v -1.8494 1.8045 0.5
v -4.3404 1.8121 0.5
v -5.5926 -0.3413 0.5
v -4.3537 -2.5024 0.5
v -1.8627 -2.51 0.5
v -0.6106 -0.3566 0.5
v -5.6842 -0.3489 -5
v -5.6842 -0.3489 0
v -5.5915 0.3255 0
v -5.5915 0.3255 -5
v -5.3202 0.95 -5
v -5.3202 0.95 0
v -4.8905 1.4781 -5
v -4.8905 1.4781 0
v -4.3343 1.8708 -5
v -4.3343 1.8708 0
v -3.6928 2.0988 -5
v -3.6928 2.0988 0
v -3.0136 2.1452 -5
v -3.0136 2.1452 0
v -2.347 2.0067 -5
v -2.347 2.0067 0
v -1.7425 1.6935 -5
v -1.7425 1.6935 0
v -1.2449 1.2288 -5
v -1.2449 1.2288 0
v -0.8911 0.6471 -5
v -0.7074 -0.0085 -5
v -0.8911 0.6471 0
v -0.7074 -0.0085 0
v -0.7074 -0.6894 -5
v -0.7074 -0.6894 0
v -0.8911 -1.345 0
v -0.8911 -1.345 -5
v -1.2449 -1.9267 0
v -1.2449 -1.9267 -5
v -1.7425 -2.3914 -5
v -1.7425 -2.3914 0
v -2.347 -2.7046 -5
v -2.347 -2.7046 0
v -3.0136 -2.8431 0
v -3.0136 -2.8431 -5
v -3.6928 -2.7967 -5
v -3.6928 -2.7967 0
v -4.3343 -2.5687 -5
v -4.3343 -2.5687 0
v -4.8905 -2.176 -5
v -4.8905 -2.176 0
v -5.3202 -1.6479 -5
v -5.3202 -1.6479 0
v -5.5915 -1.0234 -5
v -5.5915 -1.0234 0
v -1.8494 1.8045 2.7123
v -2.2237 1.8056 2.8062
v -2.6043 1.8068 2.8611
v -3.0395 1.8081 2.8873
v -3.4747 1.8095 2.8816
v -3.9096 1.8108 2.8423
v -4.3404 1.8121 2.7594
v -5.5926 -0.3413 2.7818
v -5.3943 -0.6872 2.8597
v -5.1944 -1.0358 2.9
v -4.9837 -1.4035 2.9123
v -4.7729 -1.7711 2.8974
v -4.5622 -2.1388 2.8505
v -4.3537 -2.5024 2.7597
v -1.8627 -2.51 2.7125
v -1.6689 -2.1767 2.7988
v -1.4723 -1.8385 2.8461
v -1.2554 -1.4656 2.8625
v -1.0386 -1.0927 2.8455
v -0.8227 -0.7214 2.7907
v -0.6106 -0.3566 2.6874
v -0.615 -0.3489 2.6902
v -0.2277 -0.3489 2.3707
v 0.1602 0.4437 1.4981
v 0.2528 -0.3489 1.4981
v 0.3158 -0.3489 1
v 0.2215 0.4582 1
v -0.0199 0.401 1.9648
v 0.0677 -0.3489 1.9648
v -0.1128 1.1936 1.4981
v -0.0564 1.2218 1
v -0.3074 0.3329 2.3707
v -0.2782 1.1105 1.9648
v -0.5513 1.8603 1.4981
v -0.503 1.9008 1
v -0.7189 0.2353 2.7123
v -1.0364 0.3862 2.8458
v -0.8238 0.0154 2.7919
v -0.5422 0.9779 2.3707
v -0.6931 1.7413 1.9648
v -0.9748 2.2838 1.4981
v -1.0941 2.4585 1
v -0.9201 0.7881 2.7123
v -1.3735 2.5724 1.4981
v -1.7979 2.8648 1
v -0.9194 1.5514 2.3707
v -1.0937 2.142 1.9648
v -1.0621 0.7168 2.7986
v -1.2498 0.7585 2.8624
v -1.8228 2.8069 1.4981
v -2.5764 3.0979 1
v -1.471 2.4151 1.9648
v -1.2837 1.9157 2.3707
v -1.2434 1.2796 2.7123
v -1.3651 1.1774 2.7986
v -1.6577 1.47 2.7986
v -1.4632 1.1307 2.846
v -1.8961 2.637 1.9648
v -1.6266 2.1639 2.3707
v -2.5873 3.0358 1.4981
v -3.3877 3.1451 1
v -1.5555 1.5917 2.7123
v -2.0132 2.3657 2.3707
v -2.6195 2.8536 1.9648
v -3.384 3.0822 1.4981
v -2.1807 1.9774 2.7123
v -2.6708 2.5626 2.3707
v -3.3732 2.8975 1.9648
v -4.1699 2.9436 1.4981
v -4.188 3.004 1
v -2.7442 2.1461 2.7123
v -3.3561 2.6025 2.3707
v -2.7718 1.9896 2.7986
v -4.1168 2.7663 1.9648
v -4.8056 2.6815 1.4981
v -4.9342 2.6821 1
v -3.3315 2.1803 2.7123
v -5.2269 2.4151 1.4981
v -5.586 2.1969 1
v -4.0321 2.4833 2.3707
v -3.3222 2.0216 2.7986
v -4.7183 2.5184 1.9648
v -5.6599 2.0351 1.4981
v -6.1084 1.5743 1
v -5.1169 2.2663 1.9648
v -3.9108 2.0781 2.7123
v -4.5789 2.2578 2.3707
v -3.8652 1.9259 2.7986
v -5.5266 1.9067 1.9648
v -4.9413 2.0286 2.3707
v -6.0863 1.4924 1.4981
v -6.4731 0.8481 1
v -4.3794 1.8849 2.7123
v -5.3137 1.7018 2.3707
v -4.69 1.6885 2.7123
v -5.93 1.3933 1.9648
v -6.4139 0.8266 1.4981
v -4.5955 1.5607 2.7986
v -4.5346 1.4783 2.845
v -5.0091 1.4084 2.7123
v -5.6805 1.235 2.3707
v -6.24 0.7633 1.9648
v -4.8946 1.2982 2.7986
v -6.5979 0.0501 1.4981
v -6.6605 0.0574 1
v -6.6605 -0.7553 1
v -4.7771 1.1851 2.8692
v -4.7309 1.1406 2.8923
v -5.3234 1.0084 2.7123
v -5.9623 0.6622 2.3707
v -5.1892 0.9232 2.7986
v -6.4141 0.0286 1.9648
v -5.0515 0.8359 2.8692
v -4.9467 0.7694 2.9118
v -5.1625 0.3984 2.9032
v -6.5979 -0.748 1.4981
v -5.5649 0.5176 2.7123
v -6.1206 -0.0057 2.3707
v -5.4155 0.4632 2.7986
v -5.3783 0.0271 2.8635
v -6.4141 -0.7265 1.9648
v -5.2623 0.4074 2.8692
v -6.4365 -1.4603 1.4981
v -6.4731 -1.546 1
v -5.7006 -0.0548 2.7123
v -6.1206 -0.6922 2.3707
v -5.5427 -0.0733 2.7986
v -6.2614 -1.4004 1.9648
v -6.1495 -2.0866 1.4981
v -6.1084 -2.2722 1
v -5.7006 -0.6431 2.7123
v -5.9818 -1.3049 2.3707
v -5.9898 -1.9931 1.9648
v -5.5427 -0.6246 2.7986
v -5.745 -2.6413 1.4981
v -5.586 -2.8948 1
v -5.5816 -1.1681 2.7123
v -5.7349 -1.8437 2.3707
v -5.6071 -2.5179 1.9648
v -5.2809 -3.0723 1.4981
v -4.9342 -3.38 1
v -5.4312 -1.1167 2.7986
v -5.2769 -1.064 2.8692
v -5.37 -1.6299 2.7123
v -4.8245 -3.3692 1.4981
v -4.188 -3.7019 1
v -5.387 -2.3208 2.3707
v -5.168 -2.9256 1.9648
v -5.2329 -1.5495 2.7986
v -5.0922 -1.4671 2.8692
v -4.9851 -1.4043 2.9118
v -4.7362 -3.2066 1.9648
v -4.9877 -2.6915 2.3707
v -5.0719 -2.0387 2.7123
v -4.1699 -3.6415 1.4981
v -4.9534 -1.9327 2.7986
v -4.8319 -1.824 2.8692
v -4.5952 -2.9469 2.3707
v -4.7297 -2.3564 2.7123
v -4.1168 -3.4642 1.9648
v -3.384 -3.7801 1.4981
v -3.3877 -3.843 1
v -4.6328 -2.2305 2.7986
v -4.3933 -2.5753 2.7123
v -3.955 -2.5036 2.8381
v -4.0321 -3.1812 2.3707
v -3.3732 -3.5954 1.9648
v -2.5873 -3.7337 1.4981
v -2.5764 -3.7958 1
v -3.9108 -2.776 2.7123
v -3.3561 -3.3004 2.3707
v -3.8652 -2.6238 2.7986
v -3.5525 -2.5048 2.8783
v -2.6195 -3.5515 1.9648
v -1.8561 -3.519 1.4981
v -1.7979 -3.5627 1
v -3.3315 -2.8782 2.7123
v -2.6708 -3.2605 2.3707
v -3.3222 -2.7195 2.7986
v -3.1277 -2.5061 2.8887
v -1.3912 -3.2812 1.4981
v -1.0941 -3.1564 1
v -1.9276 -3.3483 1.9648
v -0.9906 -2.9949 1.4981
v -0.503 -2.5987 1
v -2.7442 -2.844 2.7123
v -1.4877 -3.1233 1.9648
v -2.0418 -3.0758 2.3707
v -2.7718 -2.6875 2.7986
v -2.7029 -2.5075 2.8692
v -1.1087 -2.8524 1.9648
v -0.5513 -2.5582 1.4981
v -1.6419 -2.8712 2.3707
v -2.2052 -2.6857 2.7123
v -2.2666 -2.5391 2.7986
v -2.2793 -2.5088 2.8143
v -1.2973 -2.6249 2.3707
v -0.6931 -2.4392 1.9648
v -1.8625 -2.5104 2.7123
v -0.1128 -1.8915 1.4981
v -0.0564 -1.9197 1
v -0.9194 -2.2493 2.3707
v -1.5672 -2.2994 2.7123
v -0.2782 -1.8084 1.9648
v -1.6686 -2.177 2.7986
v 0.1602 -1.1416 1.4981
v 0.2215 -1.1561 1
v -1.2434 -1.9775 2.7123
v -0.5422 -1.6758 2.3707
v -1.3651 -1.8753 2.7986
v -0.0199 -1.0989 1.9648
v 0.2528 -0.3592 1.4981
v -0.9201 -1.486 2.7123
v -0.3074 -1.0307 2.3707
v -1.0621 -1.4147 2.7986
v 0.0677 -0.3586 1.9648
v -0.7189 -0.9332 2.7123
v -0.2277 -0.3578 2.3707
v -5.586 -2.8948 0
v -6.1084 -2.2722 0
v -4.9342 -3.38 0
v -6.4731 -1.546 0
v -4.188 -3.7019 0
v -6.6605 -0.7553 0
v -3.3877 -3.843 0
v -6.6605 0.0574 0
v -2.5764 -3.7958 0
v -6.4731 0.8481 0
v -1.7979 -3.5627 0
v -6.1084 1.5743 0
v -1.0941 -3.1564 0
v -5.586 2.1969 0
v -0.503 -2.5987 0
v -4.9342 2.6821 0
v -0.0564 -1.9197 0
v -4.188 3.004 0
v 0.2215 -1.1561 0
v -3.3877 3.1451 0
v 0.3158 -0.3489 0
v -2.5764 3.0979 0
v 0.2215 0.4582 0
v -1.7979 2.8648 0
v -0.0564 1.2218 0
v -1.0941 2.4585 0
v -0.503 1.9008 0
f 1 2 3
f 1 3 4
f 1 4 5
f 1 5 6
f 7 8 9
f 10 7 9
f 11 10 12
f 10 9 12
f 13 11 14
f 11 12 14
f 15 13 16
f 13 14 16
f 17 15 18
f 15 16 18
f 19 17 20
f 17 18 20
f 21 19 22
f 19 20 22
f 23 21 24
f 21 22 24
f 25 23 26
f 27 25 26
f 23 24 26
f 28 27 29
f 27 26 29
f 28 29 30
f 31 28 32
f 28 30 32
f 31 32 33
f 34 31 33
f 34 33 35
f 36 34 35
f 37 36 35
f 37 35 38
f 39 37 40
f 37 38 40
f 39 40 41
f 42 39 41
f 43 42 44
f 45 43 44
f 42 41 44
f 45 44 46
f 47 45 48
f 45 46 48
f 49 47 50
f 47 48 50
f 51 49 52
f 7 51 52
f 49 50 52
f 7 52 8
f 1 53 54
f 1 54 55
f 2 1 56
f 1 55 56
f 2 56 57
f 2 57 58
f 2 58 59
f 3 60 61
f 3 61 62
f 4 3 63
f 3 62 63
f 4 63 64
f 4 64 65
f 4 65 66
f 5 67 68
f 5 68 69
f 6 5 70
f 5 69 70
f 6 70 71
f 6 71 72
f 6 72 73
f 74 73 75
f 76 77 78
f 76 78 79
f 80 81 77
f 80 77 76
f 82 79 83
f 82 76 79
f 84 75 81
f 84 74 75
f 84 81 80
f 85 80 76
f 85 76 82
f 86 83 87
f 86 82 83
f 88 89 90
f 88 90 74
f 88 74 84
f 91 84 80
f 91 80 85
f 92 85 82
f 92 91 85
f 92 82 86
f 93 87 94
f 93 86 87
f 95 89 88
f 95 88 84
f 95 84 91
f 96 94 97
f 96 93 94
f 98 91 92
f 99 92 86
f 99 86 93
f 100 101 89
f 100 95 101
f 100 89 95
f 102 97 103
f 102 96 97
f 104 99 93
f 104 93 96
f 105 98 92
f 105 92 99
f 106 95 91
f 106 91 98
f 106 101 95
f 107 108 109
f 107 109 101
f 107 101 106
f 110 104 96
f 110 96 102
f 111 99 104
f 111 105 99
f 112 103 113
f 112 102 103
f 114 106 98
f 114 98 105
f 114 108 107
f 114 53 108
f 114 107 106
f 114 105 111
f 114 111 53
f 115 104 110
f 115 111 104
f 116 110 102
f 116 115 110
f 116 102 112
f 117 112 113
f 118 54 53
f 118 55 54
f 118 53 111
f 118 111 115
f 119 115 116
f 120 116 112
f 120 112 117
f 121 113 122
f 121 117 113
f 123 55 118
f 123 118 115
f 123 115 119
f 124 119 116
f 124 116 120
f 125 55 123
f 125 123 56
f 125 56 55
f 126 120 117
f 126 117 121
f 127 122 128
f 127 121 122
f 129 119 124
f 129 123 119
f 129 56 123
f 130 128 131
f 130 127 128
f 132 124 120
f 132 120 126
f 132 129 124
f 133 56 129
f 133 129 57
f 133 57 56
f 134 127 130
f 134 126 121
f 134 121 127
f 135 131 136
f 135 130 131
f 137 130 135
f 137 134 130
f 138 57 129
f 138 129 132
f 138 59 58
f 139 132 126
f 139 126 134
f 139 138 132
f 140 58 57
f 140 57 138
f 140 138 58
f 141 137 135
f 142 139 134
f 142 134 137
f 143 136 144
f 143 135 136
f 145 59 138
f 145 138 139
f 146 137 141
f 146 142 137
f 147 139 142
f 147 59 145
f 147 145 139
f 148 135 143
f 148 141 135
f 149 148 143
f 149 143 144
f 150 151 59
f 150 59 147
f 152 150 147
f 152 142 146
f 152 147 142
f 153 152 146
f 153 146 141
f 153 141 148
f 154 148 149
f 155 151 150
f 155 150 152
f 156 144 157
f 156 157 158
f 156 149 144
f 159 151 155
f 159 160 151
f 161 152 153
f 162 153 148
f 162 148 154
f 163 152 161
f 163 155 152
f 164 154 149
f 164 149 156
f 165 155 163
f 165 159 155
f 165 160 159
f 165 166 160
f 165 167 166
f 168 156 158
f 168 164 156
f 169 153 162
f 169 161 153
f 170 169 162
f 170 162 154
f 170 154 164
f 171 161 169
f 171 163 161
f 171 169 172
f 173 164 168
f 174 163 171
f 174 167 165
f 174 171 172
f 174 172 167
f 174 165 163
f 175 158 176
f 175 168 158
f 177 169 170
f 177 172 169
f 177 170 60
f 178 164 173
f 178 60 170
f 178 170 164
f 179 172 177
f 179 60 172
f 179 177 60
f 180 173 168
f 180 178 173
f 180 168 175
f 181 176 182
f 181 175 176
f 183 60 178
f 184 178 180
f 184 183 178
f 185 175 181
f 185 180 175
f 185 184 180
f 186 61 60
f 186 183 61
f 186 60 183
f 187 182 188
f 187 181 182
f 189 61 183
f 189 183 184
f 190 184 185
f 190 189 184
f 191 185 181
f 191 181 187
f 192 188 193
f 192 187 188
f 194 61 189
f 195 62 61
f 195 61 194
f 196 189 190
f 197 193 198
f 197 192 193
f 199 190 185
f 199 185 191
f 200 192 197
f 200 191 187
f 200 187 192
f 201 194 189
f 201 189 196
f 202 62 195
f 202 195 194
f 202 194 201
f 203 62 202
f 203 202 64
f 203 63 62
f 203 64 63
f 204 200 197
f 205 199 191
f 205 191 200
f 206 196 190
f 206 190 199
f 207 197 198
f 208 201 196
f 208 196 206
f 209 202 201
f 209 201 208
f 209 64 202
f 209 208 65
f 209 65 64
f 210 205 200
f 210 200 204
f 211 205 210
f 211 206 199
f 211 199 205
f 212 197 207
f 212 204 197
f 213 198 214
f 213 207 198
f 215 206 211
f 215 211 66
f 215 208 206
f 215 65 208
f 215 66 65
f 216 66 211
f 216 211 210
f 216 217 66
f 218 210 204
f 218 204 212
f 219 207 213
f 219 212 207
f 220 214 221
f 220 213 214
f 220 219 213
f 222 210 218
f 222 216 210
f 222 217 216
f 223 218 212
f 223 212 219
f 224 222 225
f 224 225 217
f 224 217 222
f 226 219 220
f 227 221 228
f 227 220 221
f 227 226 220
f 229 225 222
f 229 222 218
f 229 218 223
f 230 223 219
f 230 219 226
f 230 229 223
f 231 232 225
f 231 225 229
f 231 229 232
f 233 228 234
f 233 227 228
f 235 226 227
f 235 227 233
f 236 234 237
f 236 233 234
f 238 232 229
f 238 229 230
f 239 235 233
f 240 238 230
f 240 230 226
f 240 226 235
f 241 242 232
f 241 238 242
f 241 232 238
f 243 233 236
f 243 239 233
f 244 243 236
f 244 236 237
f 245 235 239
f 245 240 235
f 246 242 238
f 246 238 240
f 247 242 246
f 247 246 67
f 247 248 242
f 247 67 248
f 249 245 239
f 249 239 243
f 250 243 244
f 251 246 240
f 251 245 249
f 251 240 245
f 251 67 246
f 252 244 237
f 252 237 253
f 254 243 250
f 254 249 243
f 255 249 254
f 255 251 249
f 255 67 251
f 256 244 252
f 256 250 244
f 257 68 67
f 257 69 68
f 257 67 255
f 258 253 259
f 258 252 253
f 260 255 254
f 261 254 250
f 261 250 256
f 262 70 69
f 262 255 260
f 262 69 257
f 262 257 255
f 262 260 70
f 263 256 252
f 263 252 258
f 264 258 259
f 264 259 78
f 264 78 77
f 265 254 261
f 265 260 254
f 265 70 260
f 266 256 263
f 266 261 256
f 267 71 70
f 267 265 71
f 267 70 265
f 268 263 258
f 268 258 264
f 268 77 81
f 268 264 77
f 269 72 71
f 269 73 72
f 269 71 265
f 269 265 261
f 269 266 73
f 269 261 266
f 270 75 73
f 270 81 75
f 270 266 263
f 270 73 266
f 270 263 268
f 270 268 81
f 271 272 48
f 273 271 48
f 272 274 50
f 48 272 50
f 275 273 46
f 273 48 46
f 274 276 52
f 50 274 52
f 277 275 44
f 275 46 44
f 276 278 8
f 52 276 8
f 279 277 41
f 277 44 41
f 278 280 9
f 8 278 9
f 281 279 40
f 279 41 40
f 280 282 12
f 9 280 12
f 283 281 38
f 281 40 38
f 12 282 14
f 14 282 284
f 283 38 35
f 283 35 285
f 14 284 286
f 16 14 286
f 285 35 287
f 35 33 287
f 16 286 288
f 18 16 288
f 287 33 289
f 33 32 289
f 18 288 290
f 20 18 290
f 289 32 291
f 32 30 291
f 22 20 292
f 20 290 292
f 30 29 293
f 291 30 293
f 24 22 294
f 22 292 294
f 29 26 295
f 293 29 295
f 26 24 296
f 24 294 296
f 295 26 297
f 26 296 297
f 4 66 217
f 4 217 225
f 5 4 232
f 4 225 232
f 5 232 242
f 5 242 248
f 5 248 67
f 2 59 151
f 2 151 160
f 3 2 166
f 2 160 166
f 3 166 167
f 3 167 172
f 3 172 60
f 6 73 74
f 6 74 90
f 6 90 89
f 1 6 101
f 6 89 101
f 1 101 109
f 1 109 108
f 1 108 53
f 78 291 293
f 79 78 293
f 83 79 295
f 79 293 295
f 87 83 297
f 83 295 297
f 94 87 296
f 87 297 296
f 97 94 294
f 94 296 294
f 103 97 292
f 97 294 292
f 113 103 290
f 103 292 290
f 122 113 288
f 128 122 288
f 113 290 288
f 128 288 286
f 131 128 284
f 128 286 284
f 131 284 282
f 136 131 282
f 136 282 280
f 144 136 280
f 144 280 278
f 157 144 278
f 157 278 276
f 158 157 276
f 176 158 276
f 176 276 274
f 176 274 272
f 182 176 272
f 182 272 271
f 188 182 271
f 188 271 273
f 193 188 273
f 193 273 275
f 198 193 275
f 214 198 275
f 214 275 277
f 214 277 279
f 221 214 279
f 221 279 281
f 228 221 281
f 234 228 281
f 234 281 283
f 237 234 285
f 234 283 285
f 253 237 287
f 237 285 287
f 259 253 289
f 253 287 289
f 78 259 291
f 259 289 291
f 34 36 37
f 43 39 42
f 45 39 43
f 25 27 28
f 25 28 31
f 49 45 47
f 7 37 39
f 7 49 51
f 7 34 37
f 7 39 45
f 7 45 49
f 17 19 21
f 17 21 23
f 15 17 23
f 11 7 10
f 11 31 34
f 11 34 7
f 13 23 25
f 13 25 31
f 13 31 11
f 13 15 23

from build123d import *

# Parameters (mm, degrees)
SKETCH1_R           = 3.5
BOSS_EXTRUDE1_DEPTH = 3
SKETCH2_R           = 2.5
BOSS_EXTRUDE2_DEPTH = 5
CUT_EXTRUDE2_DEPTH  = 2.5
FILLET3_R           = 2


with BuildPart() as part:
    # Sketch1 → Boss-Extrude1 (new body)
    with BuildSketch(Plane.XY):
        with Locations((-3.184162196, -0.348949282)):
            Circle(SKETCH1_R)
    extrude(amount=BOSS_EXTRUDE1_DEPTH)

    # Sketch2 → Boss-Extrude2 (add)
    with BuildSketch(Plane(origin=(0, 0, 0), x_dir=(-1, 0, 0), z_dir=(0, 0, -1))):
        with Locations((3.184162196, -0.348949282)):
            Circle(SKETCH2_R)
    extrude(amount=BOSS_EXTRUDE2_DEPTH)

    # Sketch3 → Cut-Extrude2 (cut)
    with BuildSketch(Plane.XY.offset(3)):
        Polygon((-4.340417486, 1.812146916), (-5.592559216, -0.341272384), (-4.353714262, -2.502368582), (-1.862727578, -2.510045479), (-0.610585848, -0.356626179), (-1.849430802, 1.804470018), align=None)
    extrude(amount=-CUT_EXTRUDE2_DEPTH, mode=Mode.SUBTRACT)

    # Fillet3
    # the kernel refuses this fillet: 2 mm, written as the material it takes off along each edge
    with BuildSketch(Plane(origin=(-3.184162196, -0.348949282, 3), x_dir=(1, 0, 0), z_dir=(0, -1, 0))) as fillet3_piece_1:
        with BuildLine():
            CenterArc((3.5 - FILLET3_R, -FILLET3_R), FILLET3_R, 0, 90)
            Line((3.5 - FILLET3_R, 0), (3.5, 0))
            Line((3.5, 0), (3.5, -FILLET3_R))
        make_face()
    revolve(axis=Axis((-3.184162196, -0.348949282, 3), (0, 0, 1)), mode=Mode.SUBTRACT)


solid = part.part
